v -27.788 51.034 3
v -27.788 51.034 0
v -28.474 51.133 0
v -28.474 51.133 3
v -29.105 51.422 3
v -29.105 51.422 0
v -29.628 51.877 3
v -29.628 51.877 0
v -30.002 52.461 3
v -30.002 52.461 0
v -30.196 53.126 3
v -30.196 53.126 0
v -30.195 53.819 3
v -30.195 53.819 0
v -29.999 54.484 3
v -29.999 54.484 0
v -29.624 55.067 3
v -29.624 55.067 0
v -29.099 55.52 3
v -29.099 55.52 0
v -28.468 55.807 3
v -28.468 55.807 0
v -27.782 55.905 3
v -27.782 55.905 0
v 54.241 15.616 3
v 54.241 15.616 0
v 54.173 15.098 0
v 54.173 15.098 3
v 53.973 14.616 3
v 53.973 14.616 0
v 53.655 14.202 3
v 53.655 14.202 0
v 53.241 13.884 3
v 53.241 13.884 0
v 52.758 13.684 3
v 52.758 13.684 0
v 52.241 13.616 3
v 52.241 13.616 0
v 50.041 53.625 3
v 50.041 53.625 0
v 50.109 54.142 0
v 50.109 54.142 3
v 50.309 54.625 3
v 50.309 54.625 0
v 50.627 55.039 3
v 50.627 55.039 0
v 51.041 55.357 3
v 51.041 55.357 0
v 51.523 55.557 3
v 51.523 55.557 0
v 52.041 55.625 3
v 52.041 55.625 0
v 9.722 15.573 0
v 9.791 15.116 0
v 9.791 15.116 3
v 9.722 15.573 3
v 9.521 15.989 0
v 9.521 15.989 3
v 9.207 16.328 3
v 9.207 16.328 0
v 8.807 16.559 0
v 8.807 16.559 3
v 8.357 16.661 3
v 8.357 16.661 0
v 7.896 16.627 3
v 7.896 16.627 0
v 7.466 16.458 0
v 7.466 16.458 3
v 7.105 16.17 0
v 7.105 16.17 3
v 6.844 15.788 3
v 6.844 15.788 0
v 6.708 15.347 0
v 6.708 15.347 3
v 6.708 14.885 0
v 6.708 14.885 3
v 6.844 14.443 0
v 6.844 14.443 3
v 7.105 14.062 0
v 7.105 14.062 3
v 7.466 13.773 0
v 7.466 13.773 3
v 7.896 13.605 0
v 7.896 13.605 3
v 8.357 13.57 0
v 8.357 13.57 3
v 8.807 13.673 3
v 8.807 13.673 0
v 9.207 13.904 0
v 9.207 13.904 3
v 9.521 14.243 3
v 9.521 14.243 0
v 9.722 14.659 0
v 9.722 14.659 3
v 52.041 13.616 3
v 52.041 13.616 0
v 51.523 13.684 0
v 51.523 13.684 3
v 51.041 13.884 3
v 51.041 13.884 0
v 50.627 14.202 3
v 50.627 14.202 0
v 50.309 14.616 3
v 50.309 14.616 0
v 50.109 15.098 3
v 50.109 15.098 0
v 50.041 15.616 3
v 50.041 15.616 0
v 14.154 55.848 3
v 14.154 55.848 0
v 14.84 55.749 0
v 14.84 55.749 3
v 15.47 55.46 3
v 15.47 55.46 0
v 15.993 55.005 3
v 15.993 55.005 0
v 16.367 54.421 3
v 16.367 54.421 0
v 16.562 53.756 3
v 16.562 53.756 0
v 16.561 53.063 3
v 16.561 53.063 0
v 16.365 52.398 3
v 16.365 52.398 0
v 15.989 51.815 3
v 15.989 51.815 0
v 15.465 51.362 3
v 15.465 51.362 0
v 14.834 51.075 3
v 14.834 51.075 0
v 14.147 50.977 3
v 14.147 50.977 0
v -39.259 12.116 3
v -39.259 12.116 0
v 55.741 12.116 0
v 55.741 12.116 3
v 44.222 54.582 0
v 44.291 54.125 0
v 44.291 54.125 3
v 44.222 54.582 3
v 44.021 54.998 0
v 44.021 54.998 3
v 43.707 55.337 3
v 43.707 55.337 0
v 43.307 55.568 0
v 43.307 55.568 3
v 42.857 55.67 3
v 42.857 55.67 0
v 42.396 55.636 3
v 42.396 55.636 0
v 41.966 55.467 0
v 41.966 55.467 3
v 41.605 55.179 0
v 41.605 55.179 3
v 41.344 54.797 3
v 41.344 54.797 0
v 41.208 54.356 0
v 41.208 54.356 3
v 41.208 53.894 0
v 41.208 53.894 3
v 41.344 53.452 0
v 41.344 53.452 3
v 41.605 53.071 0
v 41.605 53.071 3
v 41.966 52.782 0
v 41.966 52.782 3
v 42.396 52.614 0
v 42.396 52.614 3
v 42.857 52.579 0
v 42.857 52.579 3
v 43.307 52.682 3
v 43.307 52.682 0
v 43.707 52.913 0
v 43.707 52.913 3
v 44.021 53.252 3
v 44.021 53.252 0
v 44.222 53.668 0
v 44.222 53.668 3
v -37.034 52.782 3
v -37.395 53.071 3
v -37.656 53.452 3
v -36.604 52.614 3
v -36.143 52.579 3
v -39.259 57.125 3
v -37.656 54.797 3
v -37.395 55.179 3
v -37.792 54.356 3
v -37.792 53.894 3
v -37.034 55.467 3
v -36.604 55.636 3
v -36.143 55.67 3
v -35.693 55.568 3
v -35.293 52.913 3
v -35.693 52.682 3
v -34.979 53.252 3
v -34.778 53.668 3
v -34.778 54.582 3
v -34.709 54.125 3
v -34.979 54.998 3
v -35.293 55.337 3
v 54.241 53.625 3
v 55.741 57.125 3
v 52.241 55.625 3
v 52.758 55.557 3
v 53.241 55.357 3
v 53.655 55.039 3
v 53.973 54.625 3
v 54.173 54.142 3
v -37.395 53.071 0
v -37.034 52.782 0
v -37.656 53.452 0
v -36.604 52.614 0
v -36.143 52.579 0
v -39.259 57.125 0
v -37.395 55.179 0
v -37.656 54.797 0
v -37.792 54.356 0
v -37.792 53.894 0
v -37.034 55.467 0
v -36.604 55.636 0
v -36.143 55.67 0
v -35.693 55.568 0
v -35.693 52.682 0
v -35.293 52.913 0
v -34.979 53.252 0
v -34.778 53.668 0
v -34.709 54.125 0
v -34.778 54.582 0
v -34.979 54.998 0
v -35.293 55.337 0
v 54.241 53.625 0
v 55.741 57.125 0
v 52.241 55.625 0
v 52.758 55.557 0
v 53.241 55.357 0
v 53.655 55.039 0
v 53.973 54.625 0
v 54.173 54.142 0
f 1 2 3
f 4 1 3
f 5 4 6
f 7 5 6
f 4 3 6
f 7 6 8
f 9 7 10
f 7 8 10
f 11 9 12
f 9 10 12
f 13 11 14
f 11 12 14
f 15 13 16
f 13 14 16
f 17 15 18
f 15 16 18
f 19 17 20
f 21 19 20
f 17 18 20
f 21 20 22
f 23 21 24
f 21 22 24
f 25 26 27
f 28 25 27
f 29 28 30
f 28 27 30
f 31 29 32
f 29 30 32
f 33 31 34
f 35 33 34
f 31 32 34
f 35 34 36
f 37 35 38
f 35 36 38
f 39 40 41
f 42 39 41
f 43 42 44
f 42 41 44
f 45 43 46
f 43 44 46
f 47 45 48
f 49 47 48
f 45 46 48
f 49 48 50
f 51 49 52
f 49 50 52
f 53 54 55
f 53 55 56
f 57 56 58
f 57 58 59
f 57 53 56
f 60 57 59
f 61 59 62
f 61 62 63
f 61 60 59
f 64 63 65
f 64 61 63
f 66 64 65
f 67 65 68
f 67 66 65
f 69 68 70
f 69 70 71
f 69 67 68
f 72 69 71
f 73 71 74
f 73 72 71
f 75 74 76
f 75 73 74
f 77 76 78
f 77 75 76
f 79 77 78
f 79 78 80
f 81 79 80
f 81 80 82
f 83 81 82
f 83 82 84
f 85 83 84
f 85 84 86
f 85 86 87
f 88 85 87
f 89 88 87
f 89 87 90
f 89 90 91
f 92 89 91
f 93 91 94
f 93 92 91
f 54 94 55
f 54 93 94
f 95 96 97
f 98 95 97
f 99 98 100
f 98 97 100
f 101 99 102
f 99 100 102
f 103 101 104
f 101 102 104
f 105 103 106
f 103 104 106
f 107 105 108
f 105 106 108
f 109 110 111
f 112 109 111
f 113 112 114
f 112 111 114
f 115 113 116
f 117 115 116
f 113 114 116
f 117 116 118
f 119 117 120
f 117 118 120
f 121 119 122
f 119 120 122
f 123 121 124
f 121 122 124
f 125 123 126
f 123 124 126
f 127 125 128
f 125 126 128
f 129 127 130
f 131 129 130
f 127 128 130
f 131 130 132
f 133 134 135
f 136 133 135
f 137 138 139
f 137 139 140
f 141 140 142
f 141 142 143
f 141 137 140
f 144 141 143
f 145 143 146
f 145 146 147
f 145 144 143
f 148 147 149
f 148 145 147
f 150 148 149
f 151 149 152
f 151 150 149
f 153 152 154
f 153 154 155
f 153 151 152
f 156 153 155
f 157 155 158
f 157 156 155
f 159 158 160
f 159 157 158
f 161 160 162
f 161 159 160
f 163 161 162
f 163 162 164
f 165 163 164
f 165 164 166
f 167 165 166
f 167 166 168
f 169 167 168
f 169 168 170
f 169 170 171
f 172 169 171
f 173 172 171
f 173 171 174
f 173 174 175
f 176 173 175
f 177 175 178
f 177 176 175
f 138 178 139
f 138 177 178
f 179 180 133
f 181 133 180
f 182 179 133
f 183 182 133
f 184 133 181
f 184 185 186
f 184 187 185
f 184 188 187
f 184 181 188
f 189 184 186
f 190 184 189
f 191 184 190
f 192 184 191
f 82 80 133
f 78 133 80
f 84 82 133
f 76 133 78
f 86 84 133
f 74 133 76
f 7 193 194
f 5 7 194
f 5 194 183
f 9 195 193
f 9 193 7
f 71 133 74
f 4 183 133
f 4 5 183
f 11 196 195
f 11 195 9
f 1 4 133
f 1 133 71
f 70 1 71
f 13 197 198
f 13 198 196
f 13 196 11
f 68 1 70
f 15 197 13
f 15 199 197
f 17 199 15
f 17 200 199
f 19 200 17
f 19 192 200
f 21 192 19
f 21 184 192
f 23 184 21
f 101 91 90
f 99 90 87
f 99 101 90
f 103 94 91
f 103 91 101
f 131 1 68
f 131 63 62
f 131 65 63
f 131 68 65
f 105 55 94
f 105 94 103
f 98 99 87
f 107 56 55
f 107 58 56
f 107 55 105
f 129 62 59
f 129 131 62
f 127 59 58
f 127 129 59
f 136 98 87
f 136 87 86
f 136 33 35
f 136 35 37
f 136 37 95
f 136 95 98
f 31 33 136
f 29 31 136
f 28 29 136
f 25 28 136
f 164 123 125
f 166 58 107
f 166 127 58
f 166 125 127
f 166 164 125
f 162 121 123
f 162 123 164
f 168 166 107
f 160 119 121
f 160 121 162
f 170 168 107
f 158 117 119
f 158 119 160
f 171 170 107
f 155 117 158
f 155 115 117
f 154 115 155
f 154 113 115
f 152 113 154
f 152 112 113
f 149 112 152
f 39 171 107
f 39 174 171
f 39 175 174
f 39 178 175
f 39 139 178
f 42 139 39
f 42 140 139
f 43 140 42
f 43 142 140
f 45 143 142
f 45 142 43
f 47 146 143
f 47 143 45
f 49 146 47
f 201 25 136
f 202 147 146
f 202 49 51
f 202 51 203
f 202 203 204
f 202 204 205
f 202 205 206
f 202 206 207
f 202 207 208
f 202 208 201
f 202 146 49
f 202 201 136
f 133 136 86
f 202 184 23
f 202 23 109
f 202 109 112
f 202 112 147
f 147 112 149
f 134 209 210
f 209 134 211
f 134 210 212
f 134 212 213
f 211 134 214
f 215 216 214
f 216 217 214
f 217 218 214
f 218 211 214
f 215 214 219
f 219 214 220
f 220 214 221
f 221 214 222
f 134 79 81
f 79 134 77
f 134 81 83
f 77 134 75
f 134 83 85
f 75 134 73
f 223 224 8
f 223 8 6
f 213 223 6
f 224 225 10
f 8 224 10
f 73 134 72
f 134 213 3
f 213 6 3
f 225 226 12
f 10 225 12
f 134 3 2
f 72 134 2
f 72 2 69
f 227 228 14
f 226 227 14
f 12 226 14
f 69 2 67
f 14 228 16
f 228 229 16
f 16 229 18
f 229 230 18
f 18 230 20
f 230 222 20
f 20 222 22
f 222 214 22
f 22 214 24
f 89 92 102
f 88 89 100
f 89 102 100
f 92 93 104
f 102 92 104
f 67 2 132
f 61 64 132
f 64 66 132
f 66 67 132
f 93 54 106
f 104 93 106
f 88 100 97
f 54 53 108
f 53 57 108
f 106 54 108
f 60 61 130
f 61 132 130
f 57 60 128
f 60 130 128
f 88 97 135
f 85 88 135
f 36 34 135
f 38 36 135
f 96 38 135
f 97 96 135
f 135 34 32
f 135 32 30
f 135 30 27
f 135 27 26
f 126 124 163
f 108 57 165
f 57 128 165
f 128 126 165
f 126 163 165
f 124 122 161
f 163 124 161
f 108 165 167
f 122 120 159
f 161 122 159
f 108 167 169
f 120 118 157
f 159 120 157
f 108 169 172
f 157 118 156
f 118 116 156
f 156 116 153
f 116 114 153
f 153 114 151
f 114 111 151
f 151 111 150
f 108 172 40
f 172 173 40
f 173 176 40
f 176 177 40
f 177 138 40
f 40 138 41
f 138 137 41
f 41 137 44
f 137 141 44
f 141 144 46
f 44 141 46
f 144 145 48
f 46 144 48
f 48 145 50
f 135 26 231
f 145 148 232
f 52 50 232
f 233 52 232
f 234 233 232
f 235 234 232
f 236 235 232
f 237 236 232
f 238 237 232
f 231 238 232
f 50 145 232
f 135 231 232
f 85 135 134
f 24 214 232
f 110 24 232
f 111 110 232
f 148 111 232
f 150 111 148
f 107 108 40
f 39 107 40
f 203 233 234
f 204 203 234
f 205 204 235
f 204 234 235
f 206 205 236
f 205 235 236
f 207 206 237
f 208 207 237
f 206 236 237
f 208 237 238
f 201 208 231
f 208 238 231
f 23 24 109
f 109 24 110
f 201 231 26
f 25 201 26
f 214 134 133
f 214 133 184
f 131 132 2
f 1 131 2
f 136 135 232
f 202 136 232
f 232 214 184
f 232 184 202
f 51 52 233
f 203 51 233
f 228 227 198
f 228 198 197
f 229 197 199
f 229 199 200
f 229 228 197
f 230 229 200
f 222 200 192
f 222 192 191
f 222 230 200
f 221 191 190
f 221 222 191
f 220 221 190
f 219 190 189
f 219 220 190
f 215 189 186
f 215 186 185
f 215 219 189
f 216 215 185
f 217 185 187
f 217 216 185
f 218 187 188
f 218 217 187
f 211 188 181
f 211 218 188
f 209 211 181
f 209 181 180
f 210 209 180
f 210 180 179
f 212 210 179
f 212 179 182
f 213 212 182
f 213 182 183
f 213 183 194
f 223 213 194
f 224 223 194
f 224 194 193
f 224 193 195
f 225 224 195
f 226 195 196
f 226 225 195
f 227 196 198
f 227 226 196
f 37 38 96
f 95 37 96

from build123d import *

# Parameters (mm, degrees)
SKETCH4_W           = 95
SKETCH4_H           = 45.00899887
SKETCH4_R           = 1.54999944
BOSS_EXTRUDE6_DEPTH = 3


with BuildPart() as part:
    # Sketch4 → Boss-Extrude6 (new body)
    with BuildSketch(Plane.XY):
        with Locations((8.24074008, 34.620274583)):
            Rectangle(SKETCH4_W, SKETCH4_H)
        with Locations((42.74074118, 54.124774018)):
            Circle(SKETCH4_R, mode=Mode.SUBTRACT)
        with Locations((8.24073906, 15.115774228)):
            Circle(SKETCH4_R, mode=Mode.SUBTRACT)
        with Locations((-36.25926084, 54.124774018)):
            Circle(SKETCH4_R, mode=Mode.SUBTRACT)
        with BuildLine():
            Line((52.04074008, 55.624774018), (52.24074008, 55.624774018))
            ThreePointArc((52.24074008, 55.624774018), (53.654953642, 55.038987581), (54.24074008, 53.624774018))
            Line((54.24074008, 53.624774018), (54.24074008, 15.615775148))
            ThreePointArc((54.24074008, 15.615775148), (53.654953642, 14.201561585), (52.24074008, 13.615775148))
            Line((52.24074008, 13.615775148), (52.04074008, 13.615775148))
            ThreePointArc((52.04074008, 13.615775148), (50.626526517, 14.201561585), (50.04074008, 15.615775148))
            Line((50.04074008, 15.615775148), (50.04074008, 53.624774018))
            ThreePointArc((50.04074008, 53.624774018), (50.626526517, 55.038987581), (52.04074008, 55.624774018))
        make_face(mode=Mode.SUBTRACT)
        with BuildLine():
            Line((14.14745222, 50.977241122), (-27.788451431, 51.033818491))
            ThreePointArc((-27.788451431, 51.033818491), (-30.220596767, 53.472535297), (-27.781879961, 55.904680633))
            Line((-27.781879961, 55.904680633), (14.15402369, 55.848103264))
            ThreePointArc((14.15402369, 55.848103264), (16.586169026, 53.409386458), (14.14745222, 50.977241122))
        make_face(mode=Mode.SUBTRACT)
    extrude(amount=BOSS_EXTRUDE6_DEPTH)


solid = part.part
